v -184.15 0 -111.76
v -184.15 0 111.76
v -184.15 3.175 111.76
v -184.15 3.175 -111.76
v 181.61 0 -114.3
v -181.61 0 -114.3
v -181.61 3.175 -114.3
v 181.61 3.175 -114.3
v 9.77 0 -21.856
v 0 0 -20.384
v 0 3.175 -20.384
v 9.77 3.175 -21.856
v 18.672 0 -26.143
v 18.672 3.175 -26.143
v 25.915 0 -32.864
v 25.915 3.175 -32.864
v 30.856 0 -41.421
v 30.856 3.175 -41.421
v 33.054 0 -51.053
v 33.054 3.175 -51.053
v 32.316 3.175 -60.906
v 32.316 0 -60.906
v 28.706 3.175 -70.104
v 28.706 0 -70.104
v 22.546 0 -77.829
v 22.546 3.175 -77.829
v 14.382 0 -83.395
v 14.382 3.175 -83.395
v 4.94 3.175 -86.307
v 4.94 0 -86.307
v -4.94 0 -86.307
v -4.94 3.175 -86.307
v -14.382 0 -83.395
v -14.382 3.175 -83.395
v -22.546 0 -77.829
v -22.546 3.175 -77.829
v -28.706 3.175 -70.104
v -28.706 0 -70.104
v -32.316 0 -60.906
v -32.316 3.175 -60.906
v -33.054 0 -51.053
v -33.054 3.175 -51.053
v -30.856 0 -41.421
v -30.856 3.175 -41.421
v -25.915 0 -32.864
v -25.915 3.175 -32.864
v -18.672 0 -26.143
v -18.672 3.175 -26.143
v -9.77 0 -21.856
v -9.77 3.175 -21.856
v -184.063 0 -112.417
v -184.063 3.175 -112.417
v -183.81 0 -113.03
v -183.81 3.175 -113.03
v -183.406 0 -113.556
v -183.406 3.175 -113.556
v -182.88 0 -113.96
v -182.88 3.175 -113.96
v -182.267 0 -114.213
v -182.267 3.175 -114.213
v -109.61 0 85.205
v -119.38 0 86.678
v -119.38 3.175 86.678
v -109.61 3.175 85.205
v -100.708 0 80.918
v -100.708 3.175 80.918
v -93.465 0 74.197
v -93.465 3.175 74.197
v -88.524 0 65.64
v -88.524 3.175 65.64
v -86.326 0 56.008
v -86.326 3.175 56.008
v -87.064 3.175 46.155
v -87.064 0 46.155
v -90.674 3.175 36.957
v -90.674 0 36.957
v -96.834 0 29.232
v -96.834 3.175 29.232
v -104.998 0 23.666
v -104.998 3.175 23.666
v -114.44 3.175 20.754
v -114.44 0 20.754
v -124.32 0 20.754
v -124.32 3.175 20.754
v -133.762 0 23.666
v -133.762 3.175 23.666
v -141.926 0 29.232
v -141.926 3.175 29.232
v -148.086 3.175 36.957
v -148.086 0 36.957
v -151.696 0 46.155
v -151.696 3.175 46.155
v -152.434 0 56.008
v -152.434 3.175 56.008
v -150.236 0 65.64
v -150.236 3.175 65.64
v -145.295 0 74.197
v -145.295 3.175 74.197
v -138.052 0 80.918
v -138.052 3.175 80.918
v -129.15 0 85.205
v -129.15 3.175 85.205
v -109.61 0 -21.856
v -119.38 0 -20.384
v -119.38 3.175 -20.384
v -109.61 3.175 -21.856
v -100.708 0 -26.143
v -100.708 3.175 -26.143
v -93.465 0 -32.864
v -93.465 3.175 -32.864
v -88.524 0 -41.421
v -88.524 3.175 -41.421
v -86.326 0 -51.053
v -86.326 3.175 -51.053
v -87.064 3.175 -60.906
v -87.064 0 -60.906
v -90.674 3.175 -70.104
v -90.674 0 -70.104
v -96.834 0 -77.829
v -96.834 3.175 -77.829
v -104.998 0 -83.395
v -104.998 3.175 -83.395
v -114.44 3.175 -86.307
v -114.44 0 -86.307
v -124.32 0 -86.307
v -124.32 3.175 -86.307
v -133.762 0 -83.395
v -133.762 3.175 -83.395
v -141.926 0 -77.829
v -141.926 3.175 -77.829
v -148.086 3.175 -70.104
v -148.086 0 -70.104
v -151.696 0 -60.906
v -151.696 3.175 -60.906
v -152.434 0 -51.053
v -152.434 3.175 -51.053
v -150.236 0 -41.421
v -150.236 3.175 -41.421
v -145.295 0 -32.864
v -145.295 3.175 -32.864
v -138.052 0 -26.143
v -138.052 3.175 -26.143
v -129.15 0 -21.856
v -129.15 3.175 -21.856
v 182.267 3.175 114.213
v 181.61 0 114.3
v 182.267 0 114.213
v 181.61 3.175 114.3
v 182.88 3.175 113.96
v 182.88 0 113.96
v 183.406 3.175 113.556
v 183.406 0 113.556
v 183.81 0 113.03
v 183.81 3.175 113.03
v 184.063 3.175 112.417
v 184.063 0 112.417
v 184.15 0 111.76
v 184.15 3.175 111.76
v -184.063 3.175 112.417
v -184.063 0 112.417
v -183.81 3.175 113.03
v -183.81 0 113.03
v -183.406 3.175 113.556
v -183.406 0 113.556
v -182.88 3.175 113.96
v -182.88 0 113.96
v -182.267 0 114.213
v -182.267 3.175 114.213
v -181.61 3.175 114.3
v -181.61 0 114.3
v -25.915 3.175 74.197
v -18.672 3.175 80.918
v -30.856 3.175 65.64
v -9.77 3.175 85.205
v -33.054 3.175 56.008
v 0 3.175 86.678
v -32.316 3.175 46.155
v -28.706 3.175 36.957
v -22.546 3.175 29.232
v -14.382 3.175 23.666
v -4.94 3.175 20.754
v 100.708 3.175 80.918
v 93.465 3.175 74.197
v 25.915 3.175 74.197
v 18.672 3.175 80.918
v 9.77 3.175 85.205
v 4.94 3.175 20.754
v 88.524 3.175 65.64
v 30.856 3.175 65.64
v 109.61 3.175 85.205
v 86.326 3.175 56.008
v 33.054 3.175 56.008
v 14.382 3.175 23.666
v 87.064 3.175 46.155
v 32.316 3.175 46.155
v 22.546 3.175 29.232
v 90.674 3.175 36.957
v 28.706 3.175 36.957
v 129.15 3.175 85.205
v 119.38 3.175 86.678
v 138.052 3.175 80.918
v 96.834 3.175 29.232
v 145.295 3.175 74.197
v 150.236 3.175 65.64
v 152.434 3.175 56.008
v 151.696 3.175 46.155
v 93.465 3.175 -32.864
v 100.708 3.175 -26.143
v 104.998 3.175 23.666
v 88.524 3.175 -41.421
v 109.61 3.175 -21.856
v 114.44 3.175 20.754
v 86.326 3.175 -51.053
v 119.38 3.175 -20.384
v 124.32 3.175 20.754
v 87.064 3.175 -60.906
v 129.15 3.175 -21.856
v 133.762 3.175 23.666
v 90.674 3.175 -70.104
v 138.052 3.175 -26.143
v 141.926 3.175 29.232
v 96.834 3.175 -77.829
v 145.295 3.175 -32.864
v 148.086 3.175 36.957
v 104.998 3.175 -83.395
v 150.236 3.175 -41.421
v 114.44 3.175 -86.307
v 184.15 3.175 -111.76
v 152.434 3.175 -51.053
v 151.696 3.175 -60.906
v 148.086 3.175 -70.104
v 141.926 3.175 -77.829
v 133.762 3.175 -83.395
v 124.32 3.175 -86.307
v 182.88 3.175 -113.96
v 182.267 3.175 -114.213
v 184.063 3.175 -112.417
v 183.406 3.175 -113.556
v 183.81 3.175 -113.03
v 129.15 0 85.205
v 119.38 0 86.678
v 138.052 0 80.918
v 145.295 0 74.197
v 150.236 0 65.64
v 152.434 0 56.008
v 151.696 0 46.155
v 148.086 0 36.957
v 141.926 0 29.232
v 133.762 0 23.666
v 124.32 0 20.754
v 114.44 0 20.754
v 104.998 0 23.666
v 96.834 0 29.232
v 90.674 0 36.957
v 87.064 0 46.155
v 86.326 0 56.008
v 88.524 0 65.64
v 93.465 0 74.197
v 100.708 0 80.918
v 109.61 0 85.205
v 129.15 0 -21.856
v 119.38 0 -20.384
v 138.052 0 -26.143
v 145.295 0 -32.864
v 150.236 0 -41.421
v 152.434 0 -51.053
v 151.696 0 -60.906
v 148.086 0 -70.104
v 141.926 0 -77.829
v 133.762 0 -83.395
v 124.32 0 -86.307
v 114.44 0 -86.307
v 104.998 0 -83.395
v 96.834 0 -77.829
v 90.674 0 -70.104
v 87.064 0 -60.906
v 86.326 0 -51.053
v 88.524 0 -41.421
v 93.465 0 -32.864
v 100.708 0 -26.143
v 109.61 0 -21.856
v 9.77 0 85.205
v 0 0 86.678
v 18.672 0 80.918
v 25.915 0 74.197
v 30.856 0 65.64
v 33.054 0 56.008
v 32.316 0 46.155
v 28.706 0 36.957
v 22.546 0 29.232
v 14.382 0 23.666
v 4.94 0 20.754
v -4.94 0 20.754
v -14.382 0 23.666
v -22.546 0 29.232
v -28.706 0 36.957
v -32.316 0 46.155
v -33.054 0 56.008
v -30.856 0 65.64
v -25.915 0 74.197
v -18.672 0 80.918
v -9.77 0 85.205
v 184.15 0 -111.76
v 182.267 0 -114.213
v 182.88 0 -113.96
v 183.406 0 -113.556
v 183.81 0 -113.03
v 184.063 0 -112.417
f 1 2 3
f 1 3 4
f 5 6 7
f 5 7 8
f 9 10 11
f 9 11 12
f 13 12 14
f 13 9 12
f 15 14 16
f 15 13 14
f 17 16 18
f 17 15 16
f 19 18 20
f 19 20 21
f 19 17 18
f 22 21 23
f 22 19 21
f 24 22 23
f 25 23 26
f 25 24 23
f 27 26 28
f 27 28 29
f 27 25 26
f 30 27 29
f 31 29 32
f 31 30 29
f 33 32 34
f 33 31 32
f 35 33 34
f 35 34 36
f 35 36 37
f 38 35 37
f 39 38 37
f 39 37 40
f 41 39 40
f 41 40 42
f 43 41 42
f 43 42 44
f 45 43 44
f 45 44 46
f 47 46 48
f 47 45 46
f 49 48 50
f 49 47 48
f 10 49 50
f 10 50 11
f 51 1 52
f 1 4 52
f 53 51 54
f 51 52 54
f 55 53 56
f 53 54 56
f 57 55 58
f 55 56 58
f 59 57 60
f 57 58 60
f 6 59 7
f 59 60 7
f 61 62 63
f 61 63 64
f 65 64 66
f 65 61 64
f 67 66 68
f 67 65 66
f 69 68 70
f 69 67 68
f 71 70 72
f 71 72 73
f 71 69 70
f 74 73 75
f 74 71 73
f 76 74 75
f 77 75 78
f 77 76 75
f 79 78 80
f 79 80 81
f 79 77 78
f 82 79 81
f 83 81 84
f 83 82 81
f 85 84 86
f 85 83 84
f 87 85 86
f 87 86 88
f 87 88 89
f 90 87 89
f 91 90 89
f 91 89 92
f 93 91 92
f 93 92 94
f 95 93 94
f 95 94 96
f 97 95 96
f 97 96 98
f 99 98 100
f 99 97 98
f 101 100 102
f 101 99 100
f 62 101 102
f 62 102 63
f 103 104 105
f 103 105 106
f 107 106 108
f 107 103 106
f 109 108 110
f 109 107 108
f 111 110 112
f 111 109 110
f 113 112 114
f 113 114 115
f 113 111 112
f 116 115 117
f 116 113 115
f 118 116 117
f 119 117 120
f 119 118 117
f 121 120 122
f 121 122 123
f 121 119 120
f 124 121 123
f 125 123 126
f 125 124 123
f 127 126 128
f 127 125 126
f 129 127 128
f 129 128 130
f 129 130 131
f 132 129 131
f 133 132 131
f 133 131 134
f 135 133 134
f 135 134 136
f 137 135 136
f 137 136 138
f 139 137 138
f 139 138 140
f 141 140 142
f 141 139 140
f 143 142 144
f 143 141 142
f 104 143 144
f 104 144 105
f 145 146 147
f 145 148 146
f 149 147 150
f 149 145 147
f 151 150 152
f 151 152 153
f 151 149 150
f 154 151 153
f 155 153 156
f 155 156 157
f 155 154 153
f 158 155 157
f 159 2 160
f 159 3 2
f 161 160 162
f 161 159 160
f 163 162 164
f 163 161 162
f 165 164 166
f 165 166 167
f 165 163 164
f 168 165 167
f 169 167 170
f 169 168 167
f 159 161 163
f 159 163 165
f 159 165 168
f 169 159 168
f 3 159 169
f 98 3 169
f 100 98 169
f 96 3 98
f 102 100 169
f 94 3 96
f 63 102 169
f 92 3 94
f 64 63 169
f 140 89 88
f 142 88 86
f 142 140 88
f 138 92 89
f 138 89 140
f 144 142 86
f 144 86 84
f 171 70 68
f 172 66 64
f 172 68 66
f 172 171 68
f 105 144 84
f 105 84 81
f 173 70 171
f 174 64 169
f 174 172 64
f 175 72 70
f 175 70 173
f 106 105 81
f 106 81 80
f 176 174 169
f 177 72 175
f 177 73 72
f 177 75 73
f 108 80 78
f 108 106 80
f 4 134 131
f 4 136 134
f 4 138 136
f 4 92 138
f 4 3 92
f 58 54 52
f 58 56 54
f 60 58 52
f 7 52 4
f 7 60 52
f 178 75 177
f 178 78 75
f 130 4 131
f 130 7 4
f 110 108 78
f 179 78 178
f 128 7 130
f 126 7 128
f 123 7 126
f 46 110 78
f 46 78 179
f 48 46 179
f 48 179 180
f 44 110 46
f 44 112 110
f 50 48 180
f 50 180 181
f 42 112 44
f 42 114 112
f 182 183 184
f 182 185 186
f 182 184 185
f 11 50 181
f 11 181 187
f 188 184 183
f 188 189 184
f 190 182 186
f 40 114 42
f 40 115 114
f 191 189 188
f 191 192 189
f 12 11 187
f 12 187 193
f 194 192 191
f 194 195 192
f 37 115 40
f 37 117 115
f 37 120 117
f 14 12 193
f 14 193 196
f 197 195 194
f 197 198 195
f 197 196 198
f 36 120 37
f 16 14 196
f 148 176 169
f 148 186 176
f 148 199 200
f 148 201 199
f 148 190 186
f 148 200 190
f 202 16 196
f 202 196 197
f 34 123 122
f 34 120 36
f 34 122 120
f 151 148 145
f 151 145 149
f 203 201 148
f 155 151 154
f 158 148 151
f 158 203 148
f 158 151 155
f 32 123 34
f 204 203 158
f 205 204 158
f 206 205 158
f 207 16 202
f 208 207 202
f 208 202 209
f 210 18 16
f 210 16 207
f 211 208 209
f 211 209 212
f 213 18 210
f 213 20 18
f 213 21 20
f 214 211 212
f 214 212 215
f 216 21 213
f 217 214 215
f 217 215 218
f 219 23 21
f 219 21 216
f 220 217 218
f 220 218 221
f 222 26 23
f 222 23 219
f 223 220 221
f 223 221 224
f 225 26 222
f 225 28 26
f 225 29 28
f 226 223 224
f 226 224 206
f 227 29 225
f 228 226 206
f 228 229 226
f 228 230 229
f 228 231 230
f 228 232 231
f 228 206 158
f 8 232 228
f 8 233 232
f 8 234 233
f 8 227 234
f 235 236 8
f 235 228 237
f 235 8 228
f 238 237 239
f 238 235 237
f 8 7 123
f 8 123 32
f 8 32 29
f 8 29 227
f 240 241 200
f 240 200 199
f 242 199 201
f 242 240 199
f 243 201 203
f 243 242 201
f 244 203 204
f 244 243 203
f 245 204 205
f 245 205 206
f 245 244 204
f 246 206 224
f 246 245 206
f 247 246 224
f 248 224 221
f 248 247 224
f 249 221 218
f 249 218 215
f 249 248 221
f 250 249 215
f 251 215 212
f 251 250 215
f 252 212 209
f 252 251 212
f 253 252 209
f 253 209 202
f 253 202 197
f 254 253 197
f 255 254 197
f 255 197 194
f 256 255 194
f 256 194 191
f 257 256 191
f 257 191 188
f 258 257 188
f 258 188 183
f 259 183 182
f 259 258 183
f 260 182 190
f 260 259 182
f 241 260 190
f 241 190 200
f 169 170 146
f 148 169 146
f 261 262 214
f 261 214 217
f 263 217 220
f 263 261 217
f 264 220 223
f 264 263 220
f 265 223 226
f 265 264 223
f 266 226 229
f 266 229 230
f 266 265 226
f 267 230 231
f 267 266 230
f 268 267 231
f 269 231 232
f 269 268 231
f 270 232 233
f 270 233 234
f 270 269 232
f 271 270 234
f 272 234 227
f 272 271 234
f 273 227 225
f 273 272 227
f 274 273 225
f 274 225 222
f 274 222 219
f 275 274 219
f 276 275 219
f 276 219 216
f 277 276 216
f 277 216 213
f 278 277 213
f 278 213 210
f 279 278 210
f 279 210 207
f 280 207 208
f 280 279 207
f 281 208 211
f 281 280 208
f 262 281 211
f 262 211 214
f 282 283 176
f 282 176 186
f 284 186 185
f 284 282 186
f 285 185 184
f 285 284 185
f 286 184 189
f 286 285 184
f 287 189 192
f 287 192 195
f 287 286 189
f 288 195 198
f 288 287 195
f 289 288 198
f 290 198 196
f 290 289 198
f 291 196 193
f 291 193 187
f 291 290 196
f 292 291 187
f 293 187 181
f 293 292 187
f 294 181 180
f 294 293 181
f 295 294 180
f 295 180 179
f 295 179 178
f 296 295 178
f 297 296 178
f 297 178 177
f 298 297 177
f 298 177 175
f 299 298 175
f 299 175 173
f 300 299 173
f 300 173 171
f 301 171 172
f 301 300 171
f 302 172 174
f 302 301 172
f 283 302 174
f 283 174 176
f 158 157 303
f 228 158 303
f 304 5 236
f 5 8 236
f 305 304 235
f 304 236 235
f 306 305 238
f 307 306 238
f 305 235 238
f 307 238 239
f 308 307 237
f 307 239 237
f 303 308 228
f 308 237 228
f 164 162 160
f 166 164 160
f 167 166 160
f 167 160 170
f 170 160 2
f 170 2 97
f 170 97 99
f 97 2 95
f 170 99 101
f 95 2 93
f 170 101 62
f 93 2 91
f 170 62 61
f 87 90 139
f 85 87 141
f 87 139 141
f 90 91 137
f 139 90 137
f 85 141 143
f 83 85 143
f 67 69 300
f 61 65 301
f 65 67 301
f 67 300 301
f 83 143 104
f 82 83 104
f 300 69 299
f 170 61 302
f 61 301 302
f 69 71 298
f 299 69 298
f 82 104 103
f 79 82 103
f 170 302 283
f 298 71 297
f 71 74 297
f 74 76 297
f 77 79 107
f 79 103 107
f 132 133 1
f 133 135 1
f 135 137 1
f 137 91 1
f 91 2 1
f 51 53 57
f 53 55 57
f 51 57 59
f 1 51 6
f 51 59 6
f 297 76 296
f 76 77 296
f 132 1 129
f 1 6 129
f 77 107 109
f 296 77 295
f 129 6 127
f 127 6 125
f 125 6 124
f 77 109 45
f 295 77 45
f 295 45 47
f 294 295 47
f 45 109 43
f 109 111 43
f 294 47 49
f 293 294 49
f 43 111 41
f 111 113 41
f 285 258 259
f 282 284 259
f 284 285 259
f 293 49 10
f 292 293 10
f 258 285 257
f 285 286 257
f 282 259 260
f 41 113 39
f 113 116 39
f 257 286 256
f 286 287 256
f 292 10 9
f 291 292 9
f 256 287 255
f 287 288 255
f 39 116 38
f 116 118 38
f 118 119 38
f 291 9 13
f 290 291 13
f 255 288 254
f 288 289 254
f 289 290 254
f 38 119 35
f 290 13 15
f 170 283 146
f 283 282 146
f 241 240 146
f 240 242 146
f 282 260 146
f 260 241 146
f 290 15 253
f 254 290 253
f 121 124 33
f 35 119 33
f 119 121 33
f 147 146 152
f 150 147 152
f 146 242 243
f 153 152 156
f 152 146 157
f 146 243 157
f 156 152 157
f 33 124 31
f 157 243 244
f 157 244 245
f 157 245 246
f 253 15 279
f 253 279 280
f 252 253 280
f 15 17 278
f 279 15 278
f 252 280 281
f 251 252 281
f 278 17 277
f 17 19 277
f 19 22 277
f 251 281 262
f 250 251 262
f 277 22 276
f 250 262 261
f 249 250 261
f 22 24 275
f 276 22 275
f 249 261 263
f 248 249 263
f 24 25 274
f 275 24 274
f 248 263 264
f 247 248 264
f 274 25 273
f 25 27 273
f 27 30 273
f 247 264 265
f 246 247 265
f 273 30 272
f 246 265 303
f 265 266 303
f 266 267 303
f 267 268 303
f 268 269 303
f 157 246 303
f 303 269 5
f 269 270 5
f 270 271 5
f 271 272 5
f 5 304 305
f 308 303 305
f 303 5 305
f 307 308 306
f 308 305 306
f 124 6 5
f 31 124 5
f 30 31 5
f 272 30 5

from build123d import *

# Parameters (mm, degrees)
SKETCH1_W           = 368.3
SKETCH1_H           = 228.6
SKETCH1_R           = 33.147
BOSS_EXTRUDE1_DEPTH = 3.175
FILLET1_R           = 2.54


with BuildPart() as part:
    # Sketch1 → Boss-Extrude1 (new body)
    with BuildSketch(Plane(origin=(0, 0, 0), x_dir=(1, 0, 0), z_dir=(0, 1, 0))):
        Rectangle(SKETCH1_W, SKETCH1_H)
        with Locations(Location((119.38, 53.5305, 0), (0, 0, 270))):
            Circle(SKETCH1_R, mode=Mode.SUBTRACT)
        with Locations(Location((0, 53.5305, 0), (0, 0, 270))):
            Circle(SKETCH1_R, mode=Mode.SUBTRACT)
        with Locations(Location((-119.38, 53.5305, 0), (0, 0, 270))):
            Circle(SKETCH1_R, mode=Mode.SUBTRACT)
        with Locations(Location((-119.38, -53.5305, 0), (0, 0, 270))):
            Circle(SKETCH1_R, mode=Mode.SUBTRACT)
        with Locations(Location((0, -53.5305, 0), (0, 0, 270))):
            Circle(SKETCH1_R, mode=Mode.SUBTRACT)
        with Locations(Location((119.38, -53.5305, 0), (0, 0, 270))):
            Circle(SKETCH1_R, mode=Mode.SUBTRACT)
    extrude(amount=BOSS_EXTRUDE1_DEPTH)

    # Fillet1
    fillet1_edges = [part.edges().sort_by_distance(p)[0] for p in [
        (184.15, 1.5875, 114.3),
        (-184.15, 1.5875, 114.3),
        (-184.15, 1.5875, -114.3),
        (184.15, 1.5875, -114.3),
    ]]
    fillet(fillet1_edges, radius=FILLET1_R)


solid = part.part
